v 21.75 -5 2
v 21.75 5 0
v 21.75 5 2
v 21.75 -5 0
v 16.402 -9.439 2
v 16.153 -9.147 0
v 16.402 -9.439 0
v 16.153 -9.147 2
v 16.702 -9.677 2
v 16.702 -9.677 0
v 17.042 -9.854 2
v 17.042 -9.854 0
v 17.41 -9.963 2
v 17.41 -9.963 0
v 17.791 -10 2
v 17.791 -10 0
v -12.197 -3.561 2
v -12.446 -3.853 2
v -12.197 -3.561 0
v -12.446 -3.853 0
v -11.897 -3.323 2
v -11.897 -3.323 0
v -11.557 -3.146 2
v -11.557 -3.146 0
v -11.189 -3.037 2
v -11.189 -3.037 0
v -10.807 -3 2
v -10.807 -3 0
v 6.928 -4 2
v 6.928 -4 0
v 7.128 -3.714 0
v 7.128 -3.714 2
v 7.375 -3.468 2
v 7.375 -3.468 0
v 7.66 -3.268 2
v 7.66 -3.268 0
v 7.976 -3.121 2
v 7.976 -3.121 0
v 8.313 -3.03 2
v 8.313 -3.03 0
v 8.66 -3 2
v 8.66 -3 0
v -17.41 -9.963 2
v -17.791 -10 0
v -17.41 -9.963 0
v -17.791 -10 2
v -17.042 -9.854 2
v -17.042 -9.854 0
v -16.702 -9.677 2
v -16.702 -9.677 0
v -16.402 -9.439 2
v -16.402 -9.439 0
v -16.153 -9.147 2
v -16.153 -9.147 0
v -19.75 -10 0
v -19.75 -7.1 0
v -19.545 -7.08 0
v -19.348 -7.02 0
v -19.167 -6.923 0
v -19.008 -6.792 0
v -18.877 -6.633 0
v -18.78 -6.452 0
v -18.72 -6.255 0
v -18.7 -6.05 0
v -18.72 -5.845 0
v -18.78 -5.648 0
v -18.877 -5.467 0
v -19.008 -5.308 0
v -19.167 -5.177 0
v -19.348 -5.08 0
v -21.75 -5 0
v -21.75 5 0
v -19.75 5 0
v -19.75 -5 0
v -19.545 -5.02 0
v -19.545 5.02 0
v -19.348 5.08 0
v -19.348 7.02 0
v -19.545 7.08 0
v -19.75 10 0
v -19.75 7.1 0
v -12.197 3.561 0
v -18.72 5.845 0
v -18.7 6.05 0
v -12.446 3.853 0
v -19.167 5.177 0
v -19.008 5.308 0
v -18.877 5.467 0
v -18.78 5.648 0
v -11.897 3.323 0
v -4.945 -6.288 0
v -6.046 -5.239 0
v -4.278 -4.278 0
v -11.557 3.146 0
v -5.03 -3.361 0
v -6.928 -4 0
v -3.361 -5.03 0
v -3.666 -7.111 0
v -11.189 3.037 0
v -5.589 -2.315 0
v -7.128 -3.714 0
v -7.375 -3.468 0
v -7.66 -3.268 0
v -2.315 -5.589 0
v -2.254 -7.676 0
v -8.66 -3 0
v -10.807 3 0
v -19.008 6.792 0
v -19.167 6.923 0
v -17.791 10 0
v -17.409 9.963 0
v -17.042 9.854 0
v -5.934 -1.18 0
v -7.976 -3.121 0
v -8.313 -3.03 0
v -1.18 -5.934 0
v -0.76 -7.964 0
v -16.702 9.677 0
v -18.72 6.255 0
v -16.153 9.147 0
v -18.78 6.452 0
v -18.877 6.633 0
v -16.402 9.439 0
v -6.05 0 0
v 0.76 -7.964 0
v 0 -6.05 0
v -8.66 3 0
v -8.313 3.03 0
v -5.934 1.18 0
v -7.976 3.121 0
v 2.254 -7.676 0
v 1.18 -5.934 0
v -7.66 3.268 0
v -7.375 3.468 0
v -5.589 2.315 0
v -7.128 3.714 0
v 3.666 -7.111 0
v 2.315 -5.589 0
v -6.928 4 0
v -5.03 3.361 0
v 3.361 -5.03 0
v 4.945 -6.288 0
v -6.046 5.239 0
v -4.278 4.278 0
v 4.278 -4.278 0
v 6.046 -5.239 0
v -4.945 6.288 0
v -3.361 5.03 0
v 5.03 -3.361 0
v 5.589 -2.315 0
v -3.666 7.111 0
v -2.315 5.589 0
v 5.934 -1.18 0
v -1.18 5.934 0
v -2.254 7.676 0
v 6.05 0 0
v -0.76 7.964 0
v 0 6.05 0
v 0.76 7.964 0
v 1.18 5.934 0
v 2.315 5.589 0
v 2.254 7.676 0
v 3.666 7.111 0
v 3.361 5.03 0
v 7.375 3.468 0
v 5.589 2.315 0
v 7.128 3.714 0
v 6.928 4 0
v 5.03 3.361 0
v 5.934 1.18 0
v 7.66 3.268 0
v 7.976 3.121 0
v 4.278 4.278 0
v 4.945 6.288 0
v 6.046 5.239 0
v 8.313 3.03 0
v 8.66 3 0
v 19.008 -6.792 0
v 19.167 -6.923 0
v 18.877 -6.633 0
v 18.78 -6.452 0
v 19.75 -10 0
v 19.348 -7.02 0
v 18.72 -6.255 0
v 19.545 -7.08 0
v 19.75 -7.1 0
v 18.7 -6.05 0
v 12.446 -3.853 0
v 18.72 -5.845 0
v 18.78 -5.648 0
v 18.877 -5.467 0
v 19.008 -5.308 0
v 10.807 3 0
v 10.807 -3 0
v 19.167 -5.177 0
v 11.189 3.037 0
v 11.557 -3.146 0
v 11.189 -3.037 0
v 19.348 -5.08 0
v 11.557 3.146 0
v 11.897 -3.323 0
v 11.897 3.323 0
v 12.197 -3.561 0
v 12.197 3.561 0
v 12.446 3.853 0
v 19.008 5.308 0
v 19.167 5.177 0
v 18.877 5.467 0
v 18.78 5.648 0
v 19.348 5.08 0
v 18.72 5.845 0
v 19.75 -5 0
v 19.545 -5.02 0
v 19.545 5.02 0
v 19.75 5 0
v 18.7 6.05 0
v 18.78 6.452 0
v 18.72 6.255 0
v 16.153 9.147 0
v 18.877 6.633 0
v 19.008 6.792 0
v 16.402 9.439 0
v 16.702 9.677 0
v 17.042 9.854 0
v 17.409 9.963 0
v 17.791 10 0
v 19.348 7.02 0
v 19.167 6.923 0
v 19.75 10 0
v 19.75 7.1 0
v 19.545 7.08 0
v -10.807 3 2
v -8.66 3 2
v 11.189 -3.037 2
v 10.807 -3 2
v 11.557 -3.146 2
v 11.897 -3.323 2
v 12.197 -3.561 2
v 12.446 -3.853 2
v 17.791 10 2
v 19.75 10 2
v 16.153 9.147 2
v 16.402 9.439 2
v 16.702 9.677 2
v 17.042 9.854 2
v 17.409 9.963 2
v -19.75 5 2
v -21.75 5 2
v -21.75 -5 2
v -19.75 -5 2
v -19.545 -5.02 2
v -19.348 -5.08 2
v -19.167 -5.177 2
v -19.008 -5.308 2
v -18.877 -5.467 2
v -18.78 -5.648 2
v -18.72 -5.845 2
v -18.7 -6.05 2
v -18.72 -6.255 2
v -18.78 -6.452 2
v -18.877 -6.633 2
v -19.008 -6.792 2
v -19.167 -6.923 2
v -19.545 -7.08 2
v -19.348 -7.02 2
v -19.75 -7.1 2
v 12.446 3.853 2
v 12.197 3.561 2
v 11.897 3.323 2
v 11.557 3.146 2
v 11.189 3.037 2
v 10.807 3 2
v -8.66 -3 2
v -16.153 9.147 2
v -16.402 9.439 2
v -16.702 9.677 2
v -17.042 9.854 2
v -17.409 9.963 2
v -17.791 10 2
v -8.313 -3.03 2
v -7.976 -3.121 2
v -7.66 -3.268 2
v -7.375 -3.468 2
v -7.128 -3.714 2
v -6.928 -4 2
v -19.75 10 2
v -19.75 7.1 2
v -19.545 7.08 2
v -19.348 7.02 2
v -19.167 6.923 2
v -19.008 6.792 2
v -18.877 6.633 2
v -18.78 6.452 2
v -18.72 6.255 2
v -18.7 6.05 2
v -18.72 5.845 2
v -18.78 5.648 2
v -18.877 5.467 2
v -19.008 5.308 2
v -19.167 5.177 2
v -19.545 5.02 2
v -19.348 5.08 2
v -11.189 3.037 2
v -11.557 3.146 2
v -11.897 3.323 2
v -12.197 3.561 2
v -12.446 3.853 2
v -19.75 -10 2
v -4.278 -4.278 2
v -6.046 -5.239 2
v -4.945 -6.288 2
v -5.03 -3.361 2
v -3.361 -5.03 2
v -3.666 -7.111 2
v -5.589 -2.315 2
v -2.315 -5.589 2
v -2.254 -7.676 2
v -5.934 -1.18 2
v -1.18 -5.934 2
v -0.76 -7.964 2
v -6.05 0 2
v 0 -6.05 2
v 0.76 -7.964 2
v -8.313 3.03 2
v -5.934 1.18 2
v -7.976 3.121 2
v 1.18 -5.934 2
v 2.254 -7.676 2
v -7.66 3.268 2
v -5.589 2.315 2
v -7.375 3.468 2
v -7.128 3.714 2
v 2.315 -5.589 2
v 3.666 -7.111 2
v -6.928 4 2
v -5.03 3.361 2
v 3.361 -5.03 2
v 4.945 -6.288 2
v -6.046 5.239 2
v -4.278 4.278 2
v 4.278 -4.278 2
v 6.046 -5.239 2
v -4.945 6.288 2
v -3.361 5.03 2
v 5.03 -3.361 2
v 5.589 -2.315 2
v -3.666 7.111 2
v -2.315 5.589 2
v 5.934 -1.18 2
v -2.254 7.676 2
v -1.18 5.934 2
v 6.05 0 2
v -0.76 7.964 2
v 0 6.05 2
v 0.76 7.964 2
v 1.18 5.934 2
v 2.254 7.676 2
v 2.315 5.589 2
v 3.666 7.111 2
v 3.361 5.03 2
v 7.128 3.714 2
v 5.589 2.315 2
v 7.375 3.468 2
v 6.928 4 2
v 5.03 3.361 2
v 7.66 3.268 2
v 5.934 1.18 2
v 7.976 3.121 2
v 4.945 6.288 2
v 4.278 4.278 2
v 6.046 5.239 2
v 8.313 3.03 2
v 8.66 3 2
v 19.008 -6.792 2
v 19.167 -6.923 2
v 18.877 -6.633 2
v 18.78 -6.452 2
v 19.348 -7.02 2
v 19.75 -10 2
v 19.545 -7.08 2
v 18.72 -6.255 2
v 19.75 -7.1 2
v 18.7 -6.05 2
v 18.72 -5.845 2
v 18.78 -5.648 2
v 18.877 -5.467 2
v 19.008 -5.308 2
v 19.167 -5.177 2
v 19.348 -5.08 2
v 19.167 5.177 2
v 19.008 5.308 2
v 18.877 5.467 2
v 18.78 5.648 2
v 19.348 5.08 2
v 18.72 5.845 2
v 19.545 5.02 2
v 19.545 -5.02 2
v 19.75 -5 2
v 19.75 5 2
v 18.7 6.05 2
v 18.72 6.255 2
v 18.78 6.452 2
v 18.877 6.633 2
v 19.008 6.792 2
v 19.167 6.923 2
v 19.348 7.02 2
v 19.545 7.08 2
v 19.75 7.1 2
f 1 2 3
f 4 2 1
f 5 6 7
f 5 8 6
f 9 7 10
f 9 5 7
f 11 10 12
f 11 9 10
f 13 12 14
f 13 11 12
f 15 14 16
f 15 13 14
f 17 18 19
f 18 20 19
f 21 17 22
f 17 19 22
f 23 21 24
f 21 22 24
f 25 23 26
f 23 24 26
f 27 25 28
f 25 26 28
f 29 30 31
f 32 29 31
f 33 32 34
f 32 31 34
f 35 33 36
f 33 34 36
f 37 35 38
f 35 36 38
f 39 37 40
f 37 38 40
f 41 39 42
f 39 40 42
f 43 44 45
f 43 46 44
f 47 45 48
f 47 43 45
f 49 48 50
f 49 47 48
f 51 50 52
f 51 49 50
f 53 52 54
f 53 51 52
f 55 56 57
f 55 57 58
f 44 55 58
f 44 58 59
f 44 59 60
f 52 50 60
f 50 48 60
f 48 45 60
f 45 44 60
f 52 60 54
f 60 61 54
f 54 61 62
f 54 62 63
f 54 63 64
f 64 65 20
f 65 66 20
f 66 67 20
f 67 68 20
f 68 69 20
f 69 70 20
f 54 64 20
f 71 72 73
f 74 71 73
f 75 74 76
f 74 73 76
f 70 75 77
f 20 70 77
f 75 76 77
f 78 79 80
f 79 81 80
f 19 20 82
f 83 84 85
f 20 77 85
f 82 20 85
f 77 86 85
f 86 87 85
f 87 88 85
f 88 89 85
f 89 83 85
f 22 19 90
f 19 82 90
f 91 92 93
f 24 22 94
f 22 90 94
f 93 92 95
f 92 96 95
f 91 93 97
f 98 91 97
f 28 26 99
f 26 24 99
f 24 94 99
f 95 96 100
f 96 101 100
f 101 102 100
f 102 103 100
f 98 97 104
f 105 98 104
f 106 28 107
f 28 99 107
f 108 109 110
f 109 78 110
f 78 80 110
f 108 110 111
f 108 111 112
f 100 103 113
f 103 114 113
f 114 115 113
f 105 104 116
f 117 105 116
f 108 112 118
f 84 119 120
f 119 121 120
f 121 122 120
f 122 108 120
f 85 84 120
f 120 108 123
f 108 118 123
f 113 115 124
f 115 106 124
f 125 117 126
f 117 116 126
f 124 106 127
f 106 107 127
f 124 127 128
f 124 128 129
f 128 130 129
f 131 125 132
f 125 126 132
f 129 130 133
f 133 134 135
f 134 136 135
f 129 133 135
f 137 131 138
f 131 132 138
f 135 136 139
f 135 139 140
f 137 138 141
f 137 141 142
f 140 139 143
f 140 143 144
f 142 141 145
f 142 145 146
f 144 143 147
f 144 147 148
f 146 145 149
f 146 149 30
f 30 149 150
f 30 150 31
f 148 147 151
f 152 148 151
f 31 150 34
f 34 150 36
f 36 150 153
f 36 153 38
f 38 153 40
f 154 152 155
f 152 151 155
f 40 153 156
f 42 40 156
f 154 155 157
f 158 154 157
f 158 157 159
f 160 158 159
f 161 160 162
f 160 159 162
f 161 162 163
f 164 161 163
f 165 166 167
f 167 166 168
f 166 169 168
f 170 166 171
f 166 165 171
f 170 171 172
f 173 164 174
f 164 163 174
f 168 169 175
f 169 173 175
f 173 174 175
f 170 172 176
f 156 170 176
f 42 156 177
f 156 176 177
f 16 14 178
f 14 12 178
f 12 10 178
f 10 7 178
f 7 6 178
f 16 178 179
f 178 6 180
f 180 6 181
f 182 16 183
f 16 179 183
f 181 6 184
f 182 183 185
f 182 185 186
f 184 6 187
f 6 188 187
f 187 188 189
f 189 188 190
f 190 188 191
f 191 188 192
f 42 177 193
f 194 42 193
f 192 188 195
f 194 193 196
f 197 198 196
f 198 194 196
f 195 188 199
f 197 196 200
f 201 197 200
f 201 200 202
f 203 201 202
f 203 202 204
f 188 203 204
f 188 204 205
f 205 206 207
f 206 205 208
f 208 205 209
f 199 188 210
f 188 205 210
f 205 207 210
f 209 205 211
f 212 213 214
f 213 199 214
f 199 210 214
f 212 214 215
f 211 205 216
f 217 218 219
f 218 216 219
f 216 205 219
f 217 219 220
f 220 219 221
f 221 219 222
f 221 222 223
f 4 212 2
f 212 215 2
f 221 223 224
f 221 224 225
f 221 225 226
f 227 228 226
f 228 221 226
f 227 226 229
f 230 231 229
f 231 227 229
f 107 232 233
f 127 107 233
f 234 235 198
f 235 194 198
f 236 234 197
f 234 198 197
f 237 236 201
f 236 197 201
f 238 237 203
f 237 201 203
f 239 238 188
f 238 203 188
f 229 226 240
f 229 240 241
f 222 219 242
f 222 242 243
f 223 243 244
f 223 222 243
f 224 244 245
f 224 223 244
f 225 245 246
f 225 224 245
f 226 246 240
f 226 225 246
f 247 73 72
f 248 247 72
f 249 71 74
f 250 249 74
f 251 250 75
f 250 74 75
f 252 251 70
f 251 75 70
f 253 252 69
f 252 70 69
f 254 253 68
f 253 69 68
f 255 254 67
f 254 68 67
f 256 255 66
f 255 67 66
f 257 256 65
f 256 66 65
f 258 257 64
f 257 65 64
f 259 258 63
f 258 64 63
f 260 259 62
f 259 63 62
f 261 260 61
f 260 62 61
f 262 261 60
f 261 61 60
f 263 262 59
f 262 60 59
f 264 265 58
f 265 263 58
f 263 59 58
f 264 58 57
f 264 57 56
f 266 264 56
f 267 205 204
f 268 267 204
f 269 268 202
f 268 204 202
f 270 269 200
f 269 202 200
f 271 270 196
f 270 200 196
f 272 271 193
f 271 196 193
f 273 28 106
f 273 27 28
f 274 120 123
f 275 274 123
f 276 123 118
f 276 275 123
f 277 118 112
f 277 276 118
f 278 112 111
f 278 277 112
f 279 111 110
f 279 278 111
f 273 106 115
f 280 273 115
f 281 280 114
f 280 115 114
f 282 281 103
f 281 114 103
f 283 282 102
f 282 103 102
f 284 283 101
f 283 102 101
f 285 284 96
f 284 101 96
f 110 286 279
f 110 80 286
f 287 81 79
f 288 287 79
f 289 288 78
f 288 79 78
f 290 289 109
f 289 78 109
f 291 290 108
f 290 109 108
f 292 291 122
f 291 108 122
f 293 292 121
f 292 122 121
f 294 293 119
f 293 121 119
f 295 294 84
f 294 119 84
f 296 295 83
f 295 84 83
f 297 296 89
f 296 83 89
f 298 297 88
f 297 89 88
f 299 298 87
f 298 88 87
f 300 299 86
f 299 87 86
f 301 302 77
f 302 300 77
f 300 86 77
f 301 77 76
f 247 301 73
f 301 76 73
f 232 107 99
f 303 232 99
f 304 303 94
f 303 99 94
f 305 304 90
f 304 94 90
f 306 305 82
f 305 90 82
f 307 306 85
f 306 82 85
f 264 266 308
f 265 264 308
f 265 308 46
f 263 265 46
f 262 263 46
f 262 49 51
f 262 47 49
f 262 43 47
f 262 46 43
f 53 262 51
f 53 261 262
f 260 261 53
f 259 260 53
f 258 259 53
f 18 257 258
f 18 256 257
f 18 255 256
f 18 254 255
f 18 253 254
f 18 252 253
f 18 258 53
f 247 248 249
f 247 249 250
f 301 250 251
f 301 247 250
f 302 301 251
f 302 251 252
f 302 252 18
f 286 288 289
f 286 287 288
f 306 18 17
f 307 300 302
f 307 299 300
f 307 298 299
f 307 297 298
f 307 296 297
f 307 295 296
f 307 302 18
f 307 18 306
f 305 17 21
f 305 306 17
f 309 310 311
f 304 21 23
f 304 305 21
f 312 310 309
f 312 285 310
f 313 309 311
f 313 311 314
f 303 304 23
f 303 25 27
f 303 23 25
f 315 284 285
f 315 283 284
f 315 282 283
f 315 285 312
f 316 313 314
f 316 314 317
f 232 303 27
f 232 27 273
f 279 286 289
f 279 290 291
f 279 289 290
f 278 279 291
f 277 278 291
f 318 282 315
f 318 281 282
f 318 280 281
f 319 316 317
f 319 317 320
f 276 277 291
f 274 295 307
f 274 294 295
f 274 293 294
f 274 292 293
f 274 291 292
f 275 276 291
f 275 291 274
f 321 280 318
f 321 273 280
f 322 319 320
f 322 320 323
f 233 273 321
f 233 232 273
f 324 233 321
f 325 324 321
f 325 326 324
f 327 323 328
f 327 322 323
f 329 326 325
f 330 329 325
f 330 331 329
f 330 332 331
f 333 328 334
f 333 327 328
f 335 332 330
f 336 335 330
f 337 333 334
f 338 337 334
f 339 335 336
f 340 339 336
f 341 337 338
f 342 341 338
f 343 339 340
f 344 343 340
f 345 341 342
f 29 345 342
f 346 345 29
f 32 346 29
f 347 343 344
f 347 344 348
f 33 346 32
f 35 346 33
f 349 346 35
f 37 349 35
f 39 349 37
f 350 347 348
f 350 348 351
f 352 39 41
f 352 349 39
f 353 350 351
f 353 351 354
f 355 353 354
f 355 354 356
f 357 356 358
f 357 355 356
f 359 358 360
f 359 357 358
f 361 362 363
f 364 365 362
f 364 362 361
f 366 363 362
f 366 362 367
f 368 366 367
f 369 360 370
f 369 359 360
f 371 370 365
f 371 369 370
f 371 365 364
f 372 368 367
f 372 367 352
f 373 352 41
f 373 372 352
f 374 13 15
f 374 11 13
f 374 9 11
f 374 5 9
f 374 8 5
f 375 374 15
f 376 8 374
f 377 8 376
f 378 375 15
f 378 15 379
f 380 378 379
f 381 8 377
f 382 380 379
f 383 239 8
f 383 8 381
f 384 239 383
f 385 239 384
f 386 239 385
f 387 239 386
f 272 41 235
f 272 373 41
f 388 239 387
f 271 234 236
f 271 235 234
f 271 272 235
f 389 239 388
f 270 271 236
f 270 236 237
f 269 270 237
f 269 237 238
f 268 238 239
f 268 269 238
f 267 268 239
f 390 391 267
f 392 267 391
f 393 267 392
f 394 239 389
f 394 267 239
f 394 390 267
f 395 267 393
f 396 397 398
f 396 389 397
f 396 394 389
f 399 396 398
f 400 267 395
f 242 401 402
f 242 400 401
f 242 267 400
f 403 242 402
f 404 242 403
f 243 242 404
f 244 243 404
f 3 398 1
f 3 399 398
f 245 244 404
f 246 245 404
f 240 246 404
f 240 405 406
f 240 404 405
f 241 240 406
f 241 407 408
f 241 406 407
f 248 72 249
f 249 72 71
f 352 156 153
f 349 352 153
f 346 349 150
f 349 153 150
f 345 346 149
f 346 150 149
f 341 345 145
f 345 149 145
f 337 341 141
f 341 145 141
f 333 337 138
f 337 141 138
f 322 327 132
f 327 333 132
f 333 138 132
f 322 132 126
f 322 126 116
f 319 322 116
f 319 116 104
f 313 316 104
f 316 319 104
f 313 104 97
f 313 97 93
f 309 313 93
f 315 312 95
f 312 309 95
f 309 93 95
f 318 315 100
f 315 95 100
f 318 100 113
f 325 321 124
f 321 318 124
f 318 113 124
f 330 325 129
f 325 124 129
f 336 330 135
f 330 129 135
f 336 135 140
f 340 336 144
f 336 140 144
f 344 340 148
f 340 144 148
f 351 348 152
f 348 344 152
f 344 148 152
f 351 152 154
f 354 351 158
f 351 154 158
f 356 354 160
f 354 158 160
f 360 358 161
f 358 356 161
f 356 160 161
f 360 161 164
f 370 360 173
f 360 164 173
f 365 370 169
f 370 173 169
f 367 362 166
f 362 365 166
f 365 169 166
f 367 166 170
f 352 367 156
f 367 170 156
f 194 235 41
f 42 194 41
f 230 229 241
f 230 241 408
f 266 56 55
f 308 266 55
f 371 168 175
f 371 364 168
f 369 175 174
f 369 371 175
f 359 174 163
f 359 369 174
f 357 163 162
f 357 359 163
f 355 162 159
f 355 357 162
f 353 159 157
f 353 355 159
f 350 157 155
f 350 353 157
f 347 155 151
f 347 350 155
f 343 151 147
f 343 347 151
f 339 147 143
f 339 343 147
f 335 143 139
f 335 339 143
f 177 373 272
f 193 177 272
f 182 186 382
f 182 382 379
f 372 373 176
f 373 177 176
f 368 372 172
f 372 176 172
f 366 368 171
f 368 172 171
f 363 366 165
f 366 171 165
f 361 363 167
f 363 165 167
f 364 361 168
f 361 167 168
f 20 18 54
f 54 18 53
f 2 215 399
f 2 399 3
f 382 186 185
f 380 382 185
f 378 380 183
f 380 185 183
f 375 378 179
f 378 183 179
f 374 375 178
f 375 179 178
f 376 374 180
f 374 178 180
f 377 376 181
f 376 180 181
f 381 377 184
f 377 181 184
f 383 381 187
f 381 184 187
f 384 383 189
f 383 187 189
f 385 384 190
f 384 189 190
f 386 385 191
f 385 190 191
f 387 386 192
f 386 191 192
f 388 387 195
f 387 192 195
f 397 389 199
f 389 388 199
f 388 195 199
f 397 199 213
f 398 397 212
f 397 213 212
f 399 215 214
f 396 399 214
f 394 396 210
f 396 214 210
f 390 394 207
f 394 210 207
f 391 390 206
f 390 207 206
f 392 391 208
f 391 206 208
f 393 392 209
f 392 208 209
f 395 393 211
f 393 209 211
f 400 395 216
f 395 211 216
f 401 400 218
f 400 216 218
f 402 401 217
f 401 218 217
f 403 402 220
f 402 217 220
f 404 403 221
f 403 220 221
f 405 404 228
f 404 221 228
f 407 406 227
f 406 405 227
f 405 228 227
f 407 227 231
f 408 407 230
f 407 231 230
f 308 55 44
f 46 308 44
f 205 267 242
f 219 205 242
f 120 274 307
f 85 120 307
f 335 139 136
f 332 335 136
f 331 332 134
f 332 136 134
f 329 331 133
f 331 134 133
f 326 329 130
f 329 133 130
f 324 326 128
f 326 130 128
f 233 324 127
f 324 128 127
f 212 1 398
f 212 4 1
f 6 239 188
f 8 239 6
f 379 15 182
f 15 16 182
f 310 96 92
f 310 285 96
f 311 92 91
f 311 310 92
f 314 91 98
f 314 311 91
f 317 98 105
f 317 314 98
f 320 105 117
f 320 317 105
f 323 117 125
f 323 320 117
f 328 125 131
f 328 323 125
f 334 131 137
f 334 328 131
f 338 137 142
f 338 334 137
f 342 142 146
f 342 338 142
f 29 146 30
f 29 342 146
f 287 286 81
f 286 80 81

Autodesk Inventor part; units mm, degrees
ref_plane "YZ Plane" through (0, 0, 0) normal (1, 0, 0) x (0, 1, 0)
ref_plane "XZ Plane" through (0, 0, 0) normal (0, 1, 0) x (-1, 0, 0)
ref_plane "XY Plane" through (0, 0, 0) normal (0, 0, 1) x (1, 0, 0)
sketch "スケッチ1" plane through (0, 0, 0) normal (0, 0, 1) x (1, 0, 0)
  circle A0 centre (0, 0) radius 10.5 construction
  circle A1 centre (-13.5, 1) radius 1.35
  line L0 (-13.5, 28) -> (13.5, 28) construction
  line L1 (13.5, 28) -> (13.5, 1) construction
  line L2 (13.5, 1) -> (-13.5, 1) construction
  line L3 (-13.5, 1) -> (-13.5, 28) construction
  circle A2 centre (-13.5, 28) radius 1.35
  circle A3 centre (13.5, 1) radius 1.35
  circle A4 centre (13.5, 28) radius 1.35
  line L4 (-19.75, 10) -> (-19.75, 7.1)
  line L5 (-19.75, 10) -> (19.75, 10)
  line L6 (19.75, 10) -> (19.75, 7.1)
  line L7 (-19.75, -7.1) -> (-19.75, -10)
  line L8 (-19.75, -10) -> (19.75, -10)
  line L9 (19.75, -7.1) -> (19.75, -10)
  line L10 (-19.75, 5) -> (-21.75, 5)
  line L11 (-21.75, 5) -> (-21.75, -5)
  line L12 (-21.75, -5) -> (-19.75, -5)
  arc A5 (-19.75, 5) -> (-19.75, 7.1) centre (-19.75, 6.05) ccw
  arc A6 (-19.75, -7.1) -> (-19.75, -5) centre (-19.75, -6.05) ccw
  line L13 (19.75, 5) -> (21.75, 5)
  line L14 (21.75, 5) -> (21.75, -5)
  line L15 (21.75, -5) -> (19.75, -5)
  arc A7 (19.75, 7.1) -> (19.75, 5) centre (19.75, 6.05) ccw
  line L16 (0, 28) -> (0, 0) construction
  arc A8 (19.75, -5) -> (19.75, -7.1) centre (19.75, -6.05) ccw
  line L17 (-21.75, 0) -> (21.75, 0) construction
  circle A9 centre (0, 0) radius 6.05
  point P0 (0, 10)
  dimension "d8" = 21
  dimension "d10" = 27
  dimension "d12" = 1
  dimension "d13" = 2.7
  dimension "d38" = 27
  dimension "d44" = 27
  dimension "d47" = 1.05
  dimension "d48" = 39.5
  dimension "d49" = 2
  dimension "d50" = 10
  dimension "d51" = 5
  dimension "d52" = 12.1
extrude "押し出し1" add sketch "スケッチ1" along normal blind 2 contours L5 L6 A7 L13 L14 L15 A8 L9 L8 L7 A6 L12 L11 L10 A5 L4
sketch "スケッチ2" plane through (0, 0, 2) normal (0, 0, 1) x (1, 0, 0)
  circle A0 centre (0, 0) radius 6.05 projected
  circle A1 centre (-13.5, 1) radius 1.35 projected
  line L0 (-19.75, -10) -> (19.75, -10) projected
  line L1 (19.75, 10) -> (-19.75, 10) projected
  line L2 (-11.8485, 3) -> (-7.4162, 3)
  arc A2 (7.4162, 3) -> (-7.4162, 3) centre (0, 0) ccw
  line L3 (7.4162, 3) -> (11.8485, 3)
  line L4 (-18.4641, 12.448) -> (18.4641, 12.448)
  line L5 (-18.4641, 12.448) -> (-11.8485, 3)
  line L6 (11.8485, 3) -> (18.4641, 12.448)
  line L7 (-11.8485, -3) -> (-7.4162, -3)
  line L8 (-11.8485, -3) -> (-24.333, -20.8295)
  line L9 (-24.333, -20.8295) -> (24.333, -20.8295)
  line L10 (11.8485, -3) -> (7.4162, -3)
  line L11 (11.8485, -3) -> (24.333, -20.8295)
  arc A3 (-7.4162, -3) -> (7.4162, -3) centre (0, 0) ccw
  line L12 (-21.75, 5) -> (-21.75, -5) projected
  line L13 (-16.75, 10) -> (-19.75, 10) construction
  line L14 (0, 0) -> (-21.75, 0) construction
  line L15 (-19.75, -10) -> (-16.75, -10) construction
  line L16 (-19.75, -10) -> (19.75, -10) construction
  line L17 (0, 0) -> (0, 10) construction
  line L18 (19.75, 10) -> (16.75, 10) construction
  line L19 (19.75, -10) -> (16.75, -10) construction
  circle A4 centre (-13.5, 1) radius 2.5 construction
  dimension "d57" = 8
  dimension "d58" = 3
  dimension "d60" = 6
  dimension "d64" = 3
  dimension "d65" = 5
extrude "押し出し2" cut sketch "スケッチ2" against normal blind 10 contours L8 L7 A3 L10 L11 L0 | L0 L11 L9 L8 | L6 L3 A2 L2 L5 L1 | L1 L5 L4 L6
fillet "フィレット1" radius 2 12 edges at (-11.8485, 3, 1) (-7.4162, 3, 1) (7.4162, 3, 1) (11.8485, -3, 1) (7.4162, -3, 1) (-7.4162, -3, 1) (-11.8485, -3, 1) (-16.75, -10, 1) (-16.75, 10, 1) (16.75, 10, 1) (16.75, -10, 1) (11.8485, 3, 1)
sketch "スケッチ3" plane through (0, 0, 0) normal (0, 0, -1) x (-1, 0, 0)
  circle A0 centre (13.5, 1) radius 1.35 projected
  circle A1 centre (13.5, 1) radius 1.35
  circle A2 centre (-13.5, 1) radius 1.35 projected
  circle A3 centre (-13.5, 1) radius 1.35
  point P0 (0, 0)
extrude "押し出し3" add sketch "スケッチ3" against normal up to surface (2 mm away)
equation "\"d38\" = d10"
equation "\"d44\" = d10"
equation "\"d50\" = d11"
equation "\"d51\" = d28"
equation "\"d60\" = 2 * d58"
equation "\"d11\" = 10"
equation "\"d28\" = 5"
properties part number "足首_サブフレーム_1_2" material "アルミニウム 2014-T4"
